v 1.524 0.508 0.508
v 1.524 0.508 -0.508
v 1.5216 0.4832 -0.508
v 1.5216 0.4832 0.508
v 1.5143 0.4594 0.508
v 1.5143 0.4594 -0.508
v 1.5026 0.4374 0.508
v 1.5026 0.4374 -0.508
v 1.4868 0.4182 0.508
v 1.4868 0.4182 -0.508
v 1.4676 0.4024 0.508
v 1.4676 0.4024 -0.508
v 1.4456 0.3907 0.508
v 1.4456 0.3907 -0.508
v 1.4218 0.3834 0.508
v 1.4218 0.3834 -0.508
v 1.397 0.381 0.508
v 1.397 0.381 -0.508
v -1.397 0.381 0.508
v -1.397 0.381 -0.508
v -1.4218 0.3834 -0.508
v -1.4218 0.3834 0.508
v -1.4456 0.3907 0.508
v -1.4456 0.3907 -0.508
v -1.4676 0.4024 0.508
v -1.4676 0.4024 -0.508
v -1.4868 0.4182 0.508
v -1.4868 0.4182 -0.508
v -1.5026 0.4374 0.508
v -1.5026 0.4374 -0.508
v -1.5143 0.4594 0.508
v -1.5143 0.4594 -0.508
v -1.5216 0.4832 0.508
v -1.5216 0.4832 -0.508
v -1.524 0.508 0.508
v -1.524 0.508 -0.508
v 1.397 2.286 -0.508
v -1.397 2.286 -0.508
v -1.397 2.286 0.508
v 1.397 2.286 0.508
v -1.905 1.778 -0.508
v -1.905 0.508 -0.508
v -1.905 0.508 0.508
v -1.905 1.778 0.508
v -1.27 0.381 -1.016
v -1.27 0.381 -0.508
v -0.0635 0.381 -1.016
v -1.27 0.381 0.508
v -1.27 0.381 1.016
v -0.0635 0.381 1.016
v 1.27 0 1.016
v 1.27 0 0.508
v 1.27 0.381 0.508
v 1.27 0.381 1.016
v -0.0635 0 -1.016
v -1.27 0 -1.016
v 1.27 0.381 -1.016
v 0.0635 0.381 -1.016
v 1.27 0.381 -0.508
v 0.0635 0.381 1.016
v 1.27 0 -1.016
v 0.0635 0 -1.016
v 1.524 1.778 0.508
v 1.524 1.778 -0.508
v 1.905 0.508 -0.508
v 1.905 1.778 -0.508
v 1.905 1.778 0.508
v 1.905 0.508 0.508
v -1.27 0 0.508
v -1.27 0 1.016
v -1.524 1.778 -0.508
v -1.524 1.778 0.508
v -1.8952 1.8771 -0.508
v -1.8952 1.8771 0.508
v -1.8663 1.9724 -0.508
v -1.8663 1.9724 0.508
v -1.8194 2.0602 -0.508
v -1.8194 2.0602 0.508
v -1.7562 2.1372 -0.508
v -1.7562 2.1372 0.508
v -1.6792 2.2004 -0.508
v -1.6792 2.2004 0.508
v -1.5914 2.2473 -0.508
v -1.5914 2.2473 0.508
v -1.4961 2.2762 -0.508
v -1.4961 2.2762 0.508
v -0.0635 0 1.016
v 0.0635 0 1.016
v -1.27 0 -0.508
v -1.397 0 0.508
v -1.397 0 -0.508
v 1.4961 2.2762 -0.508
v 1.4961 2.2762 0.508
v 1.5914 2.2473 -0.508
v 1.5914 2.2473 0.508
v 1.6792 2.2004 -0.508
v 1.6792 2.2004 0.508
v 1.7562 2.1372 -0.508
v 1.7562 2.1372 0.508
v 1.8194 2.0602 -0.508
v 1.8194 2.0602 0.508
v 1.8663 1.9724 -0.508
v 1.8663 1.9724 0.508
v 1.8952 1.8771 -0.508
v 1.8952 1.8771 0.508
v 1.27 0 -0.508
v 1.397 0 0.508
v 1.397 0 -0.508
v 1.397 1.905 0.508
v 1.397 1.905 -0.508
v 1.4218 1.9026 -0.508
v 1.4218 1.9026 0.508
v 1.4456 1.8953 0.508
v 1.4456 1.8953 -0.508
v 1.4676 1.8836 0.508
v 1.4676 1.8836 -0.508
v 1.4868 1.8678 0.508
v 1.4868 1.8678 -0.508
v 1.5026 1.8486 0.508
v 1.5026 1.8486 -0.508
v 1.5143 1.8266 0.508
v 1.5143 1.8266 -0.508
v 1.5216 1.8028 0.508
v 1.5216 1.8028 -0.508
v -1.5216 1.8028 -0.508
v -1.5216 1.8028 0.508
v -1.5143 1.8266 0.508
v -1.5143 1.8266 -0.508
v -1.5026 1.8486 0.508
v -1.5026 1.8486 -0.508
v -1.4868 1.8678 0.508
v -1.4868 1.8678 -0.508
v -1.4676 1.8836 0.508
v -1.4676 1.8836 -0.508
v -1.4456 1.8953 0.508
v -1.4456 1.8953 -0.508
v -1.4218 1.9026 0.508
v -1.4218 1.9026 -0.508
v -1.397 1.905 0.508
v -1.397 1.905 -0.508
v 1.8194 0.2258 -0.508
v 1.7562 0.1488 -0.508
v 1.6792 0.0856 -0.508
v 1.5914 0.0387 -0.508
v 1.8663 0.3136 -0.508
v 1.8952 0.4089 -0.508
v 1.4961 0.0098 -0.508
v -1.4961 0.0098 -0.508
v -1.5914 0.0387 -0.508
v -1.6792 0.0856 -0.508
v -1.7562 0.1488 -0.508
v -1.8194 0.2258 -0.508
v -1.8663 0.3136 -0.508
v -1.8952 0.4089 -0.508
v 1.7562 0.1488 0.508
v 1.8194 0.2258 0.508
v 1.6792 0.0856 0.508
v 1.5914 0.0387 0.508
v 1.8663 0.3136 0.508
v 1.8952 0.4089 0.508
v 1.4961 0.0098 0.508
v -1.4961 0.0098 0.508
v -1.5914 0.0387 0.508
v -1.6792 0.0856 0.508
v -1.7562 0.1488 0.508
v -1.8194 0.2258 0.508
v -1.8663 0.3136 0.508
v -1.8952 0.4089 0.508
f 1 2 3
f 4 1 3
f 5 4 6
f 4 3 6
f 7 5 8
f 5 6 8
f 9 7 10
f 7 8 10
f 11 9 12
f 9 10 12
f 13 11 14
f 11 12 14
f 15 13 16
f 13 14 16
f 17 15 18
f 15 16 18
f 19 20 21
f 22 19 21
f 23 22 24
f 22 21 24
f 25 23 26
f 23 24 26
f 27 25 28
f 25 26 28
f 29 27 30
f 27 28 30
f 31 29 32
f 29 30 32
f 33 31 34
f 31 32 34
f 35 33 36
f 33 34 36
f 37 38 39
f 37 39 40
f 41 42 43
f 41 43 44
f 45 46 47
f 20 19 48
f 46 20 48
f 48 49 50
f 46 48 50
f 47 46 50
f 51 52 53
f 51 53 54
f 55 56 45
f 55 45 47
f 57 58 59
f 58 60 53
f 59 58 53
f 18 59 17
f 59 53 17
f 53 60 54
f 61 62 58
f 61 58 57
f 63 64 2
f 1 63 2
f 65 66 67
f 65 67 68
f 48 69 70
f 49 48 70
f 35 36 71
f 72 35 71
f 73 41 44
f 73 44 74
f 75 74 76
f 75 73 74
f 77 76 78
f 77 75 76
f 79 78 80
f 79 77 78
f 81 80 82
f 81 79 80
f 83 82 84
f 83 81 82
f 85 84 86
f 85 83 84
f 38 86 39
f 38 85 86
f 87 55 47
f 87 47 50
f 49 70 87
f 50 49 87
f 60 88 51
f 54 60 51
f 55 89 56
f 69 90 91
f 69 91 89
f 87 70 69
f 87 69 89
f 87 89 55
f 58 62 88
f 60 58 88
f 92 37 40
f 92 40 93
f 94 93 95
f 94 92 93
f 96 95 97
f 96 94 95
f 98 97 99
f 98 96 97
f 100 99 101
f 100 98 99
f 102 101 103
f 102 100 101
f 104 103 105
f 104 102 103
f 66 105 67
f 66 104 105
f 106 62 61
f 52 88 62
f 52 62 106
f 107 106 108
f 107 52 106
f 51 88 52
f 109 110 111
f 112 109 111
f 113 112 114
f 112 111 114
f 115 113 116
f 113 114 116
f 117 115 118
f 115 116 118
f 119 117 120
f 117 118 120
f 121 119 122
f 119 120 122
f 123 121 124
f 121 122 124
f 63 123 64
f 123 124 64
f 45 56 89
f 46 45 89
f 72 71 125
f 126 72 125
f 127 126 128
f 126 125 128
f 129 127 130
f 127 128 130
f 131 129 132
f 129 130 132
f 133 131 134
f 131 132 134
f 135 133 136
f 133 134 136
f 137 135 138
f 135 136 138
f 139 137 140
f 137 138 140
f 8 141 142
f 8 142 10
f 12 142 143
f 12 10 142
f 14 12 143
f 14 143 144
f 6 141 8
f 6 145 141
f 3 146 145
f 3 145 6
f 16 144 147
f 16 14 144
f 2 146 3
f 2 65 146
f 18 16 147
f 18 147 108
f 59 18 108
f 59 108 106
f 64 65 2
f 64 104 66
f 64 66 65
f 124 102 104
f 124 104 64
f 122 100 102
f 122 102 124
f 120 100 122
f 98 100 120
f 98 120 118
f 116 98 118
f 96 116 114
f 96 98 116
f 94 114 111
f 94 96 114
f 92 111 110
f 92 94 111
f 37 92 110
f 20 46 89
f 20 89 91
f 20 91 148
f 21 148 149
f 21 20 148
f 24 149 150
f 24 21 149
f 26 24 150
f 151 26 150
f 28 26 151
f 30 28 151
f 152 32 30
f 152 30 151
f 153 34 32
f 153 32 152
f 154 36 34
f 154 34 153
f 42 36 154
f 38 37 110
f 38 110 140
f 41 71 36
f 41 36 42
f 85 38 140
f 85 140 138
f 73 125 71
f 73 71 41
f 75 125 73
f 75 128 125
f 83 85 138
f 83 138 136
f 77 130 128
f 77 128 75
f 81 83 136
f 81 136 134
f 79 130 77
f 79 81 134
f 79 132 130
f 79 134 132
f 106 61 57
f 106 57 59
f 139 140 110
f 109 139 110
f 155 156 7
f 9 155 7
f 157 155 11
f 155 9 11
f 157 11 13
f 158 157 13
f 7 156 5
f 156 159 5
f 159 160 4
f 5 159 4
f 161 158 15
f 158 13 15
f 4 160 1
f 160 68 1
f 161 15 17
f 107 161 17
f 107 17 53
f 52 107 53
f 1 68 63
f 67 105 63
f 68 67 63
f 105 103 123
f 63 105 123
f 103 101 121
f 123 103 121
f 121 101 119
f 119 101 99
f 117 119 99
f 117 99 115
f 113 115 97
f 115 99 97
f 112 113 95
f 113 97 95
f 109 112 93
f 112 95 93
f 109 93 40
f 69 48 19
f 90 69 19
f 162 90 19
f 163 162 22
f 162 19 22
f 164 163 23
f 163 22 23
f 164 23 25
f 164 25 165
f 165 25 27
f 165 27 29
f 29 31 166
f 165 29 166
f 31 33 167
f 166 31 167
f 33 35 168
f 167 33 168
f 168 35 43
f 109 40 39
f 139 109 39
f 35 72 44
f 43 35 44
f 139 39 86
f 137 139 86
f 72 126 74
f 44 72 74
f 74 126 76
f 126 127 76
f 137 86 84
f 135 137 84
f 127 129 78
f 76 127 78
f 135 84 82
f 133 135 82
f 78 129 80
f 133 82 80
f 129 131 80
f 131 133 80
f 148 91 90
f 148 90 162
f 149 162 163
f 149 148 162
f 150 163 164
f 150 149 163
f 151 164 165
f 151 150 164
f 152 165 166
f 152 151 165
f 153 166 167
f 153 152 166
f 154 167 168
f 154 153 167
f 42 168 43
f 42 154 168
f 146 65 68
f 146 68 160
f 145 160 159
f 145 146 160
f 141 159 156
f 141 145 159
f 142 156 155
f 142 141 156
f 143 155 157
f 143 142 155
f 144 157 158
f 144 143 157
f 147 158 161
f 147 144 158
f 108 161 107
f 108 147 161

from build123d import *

# Parameters (mm, degrees)
BOSS_EXTRUDE1_DEPTH      = 0.508
BOSS_EXTRUDE1_DEPTH_BACK = 0.508
SKETCH2_W                = 2.54
SKETCH2_H                = 2.032
BOSS_EXTRUDE2_DEPTH      = 0.381
SKETCH3_W                = 0.127
SKETCH3_H                = 2.032
CUT_EXTRUDE1_DEPTH       = 0.508


with BuildPart() as part:
    # Sketch1 → Boss-Extrude1 (new, two sides: drawn at the far end of the back side and taken through both)
    with BuildSketch(Plane.XY.offset(-BOSS_EXTRUDE1_DEPTH_BACK)):
        with BuildLine():
            Line((-1.397, 2.286), (1.397, 2.286))
            ThreePointArc((1.397, 2.286), (1.756210245, 2.137210245), (1.905, 1.778))
            Line((1.905, 1.778), (1.905, 0.508))
            ThreePointArc((1.905, 0.508), (1.756210245, 0.148789755), (1.397, 0))
            Line((1.397, 0), (-1.397, 0))
            ThreePointArc((-1.397, 0), (-1.756210245, 0.148789755), (-1.905, 0.508))
            Line((-1.905, 0.508), (-1.905, 1.778))
            ThreePointArc((-1.905, 1.778), (-1.756210245, 2.137210245), (-1.397, 2.286))
        make_face()
        with BuildLine():
            Line((-1.397, 1.905), (1.397, 1.905))
            ThreePointArc((1.397, 1.905), (1.486802561, 1.867802561), (1.524, 1.778))
            Line((1.524, 1.778), (1.524, 0.508))
            ThreePointArc((1.524, 0.508), (1.486802561, 0.418197439), (1.397, 0.381))
            Line((1.397, 0.381), (-1.397, 0.381))
            ThreePointArc((-1.397, 0.381), (-1.486802561, 0.418197439), (-1.524, 0.508))
            Line((-1.524, 0.508), (-1.524, 1.778))
            ThreePointArc((-1.524, 1.778), (-1.486802561, 1.867802561), (-1.397, 1.905))
        make_face(mode=Mode.SUBTRACT)
    extrude(amount=BOSS_EXTRUDE1_DEPTH + BOSS_EXTRUDE1_DEPTH_BACK)

    # Sketch2 → Boss-Extrude2 (add)
    with BuildSketch(Plane.XZ):
        Rectangle(SKETCH2_W, SKETCH2_H)
    extrude(amount=-BOSS_EXTRUDE2_DEPTH)

    # Sketch3 → Cut-Extrude1 (cut)
    with BuildSketch(Plane.XZ):
        Rectangle(SKETCH3_W, SKETCH3_H)
    extrude(amount=-CUT_EXTRUDE1_DEPTH, mode=Mode.SUBTRACT)


solid = part.part
